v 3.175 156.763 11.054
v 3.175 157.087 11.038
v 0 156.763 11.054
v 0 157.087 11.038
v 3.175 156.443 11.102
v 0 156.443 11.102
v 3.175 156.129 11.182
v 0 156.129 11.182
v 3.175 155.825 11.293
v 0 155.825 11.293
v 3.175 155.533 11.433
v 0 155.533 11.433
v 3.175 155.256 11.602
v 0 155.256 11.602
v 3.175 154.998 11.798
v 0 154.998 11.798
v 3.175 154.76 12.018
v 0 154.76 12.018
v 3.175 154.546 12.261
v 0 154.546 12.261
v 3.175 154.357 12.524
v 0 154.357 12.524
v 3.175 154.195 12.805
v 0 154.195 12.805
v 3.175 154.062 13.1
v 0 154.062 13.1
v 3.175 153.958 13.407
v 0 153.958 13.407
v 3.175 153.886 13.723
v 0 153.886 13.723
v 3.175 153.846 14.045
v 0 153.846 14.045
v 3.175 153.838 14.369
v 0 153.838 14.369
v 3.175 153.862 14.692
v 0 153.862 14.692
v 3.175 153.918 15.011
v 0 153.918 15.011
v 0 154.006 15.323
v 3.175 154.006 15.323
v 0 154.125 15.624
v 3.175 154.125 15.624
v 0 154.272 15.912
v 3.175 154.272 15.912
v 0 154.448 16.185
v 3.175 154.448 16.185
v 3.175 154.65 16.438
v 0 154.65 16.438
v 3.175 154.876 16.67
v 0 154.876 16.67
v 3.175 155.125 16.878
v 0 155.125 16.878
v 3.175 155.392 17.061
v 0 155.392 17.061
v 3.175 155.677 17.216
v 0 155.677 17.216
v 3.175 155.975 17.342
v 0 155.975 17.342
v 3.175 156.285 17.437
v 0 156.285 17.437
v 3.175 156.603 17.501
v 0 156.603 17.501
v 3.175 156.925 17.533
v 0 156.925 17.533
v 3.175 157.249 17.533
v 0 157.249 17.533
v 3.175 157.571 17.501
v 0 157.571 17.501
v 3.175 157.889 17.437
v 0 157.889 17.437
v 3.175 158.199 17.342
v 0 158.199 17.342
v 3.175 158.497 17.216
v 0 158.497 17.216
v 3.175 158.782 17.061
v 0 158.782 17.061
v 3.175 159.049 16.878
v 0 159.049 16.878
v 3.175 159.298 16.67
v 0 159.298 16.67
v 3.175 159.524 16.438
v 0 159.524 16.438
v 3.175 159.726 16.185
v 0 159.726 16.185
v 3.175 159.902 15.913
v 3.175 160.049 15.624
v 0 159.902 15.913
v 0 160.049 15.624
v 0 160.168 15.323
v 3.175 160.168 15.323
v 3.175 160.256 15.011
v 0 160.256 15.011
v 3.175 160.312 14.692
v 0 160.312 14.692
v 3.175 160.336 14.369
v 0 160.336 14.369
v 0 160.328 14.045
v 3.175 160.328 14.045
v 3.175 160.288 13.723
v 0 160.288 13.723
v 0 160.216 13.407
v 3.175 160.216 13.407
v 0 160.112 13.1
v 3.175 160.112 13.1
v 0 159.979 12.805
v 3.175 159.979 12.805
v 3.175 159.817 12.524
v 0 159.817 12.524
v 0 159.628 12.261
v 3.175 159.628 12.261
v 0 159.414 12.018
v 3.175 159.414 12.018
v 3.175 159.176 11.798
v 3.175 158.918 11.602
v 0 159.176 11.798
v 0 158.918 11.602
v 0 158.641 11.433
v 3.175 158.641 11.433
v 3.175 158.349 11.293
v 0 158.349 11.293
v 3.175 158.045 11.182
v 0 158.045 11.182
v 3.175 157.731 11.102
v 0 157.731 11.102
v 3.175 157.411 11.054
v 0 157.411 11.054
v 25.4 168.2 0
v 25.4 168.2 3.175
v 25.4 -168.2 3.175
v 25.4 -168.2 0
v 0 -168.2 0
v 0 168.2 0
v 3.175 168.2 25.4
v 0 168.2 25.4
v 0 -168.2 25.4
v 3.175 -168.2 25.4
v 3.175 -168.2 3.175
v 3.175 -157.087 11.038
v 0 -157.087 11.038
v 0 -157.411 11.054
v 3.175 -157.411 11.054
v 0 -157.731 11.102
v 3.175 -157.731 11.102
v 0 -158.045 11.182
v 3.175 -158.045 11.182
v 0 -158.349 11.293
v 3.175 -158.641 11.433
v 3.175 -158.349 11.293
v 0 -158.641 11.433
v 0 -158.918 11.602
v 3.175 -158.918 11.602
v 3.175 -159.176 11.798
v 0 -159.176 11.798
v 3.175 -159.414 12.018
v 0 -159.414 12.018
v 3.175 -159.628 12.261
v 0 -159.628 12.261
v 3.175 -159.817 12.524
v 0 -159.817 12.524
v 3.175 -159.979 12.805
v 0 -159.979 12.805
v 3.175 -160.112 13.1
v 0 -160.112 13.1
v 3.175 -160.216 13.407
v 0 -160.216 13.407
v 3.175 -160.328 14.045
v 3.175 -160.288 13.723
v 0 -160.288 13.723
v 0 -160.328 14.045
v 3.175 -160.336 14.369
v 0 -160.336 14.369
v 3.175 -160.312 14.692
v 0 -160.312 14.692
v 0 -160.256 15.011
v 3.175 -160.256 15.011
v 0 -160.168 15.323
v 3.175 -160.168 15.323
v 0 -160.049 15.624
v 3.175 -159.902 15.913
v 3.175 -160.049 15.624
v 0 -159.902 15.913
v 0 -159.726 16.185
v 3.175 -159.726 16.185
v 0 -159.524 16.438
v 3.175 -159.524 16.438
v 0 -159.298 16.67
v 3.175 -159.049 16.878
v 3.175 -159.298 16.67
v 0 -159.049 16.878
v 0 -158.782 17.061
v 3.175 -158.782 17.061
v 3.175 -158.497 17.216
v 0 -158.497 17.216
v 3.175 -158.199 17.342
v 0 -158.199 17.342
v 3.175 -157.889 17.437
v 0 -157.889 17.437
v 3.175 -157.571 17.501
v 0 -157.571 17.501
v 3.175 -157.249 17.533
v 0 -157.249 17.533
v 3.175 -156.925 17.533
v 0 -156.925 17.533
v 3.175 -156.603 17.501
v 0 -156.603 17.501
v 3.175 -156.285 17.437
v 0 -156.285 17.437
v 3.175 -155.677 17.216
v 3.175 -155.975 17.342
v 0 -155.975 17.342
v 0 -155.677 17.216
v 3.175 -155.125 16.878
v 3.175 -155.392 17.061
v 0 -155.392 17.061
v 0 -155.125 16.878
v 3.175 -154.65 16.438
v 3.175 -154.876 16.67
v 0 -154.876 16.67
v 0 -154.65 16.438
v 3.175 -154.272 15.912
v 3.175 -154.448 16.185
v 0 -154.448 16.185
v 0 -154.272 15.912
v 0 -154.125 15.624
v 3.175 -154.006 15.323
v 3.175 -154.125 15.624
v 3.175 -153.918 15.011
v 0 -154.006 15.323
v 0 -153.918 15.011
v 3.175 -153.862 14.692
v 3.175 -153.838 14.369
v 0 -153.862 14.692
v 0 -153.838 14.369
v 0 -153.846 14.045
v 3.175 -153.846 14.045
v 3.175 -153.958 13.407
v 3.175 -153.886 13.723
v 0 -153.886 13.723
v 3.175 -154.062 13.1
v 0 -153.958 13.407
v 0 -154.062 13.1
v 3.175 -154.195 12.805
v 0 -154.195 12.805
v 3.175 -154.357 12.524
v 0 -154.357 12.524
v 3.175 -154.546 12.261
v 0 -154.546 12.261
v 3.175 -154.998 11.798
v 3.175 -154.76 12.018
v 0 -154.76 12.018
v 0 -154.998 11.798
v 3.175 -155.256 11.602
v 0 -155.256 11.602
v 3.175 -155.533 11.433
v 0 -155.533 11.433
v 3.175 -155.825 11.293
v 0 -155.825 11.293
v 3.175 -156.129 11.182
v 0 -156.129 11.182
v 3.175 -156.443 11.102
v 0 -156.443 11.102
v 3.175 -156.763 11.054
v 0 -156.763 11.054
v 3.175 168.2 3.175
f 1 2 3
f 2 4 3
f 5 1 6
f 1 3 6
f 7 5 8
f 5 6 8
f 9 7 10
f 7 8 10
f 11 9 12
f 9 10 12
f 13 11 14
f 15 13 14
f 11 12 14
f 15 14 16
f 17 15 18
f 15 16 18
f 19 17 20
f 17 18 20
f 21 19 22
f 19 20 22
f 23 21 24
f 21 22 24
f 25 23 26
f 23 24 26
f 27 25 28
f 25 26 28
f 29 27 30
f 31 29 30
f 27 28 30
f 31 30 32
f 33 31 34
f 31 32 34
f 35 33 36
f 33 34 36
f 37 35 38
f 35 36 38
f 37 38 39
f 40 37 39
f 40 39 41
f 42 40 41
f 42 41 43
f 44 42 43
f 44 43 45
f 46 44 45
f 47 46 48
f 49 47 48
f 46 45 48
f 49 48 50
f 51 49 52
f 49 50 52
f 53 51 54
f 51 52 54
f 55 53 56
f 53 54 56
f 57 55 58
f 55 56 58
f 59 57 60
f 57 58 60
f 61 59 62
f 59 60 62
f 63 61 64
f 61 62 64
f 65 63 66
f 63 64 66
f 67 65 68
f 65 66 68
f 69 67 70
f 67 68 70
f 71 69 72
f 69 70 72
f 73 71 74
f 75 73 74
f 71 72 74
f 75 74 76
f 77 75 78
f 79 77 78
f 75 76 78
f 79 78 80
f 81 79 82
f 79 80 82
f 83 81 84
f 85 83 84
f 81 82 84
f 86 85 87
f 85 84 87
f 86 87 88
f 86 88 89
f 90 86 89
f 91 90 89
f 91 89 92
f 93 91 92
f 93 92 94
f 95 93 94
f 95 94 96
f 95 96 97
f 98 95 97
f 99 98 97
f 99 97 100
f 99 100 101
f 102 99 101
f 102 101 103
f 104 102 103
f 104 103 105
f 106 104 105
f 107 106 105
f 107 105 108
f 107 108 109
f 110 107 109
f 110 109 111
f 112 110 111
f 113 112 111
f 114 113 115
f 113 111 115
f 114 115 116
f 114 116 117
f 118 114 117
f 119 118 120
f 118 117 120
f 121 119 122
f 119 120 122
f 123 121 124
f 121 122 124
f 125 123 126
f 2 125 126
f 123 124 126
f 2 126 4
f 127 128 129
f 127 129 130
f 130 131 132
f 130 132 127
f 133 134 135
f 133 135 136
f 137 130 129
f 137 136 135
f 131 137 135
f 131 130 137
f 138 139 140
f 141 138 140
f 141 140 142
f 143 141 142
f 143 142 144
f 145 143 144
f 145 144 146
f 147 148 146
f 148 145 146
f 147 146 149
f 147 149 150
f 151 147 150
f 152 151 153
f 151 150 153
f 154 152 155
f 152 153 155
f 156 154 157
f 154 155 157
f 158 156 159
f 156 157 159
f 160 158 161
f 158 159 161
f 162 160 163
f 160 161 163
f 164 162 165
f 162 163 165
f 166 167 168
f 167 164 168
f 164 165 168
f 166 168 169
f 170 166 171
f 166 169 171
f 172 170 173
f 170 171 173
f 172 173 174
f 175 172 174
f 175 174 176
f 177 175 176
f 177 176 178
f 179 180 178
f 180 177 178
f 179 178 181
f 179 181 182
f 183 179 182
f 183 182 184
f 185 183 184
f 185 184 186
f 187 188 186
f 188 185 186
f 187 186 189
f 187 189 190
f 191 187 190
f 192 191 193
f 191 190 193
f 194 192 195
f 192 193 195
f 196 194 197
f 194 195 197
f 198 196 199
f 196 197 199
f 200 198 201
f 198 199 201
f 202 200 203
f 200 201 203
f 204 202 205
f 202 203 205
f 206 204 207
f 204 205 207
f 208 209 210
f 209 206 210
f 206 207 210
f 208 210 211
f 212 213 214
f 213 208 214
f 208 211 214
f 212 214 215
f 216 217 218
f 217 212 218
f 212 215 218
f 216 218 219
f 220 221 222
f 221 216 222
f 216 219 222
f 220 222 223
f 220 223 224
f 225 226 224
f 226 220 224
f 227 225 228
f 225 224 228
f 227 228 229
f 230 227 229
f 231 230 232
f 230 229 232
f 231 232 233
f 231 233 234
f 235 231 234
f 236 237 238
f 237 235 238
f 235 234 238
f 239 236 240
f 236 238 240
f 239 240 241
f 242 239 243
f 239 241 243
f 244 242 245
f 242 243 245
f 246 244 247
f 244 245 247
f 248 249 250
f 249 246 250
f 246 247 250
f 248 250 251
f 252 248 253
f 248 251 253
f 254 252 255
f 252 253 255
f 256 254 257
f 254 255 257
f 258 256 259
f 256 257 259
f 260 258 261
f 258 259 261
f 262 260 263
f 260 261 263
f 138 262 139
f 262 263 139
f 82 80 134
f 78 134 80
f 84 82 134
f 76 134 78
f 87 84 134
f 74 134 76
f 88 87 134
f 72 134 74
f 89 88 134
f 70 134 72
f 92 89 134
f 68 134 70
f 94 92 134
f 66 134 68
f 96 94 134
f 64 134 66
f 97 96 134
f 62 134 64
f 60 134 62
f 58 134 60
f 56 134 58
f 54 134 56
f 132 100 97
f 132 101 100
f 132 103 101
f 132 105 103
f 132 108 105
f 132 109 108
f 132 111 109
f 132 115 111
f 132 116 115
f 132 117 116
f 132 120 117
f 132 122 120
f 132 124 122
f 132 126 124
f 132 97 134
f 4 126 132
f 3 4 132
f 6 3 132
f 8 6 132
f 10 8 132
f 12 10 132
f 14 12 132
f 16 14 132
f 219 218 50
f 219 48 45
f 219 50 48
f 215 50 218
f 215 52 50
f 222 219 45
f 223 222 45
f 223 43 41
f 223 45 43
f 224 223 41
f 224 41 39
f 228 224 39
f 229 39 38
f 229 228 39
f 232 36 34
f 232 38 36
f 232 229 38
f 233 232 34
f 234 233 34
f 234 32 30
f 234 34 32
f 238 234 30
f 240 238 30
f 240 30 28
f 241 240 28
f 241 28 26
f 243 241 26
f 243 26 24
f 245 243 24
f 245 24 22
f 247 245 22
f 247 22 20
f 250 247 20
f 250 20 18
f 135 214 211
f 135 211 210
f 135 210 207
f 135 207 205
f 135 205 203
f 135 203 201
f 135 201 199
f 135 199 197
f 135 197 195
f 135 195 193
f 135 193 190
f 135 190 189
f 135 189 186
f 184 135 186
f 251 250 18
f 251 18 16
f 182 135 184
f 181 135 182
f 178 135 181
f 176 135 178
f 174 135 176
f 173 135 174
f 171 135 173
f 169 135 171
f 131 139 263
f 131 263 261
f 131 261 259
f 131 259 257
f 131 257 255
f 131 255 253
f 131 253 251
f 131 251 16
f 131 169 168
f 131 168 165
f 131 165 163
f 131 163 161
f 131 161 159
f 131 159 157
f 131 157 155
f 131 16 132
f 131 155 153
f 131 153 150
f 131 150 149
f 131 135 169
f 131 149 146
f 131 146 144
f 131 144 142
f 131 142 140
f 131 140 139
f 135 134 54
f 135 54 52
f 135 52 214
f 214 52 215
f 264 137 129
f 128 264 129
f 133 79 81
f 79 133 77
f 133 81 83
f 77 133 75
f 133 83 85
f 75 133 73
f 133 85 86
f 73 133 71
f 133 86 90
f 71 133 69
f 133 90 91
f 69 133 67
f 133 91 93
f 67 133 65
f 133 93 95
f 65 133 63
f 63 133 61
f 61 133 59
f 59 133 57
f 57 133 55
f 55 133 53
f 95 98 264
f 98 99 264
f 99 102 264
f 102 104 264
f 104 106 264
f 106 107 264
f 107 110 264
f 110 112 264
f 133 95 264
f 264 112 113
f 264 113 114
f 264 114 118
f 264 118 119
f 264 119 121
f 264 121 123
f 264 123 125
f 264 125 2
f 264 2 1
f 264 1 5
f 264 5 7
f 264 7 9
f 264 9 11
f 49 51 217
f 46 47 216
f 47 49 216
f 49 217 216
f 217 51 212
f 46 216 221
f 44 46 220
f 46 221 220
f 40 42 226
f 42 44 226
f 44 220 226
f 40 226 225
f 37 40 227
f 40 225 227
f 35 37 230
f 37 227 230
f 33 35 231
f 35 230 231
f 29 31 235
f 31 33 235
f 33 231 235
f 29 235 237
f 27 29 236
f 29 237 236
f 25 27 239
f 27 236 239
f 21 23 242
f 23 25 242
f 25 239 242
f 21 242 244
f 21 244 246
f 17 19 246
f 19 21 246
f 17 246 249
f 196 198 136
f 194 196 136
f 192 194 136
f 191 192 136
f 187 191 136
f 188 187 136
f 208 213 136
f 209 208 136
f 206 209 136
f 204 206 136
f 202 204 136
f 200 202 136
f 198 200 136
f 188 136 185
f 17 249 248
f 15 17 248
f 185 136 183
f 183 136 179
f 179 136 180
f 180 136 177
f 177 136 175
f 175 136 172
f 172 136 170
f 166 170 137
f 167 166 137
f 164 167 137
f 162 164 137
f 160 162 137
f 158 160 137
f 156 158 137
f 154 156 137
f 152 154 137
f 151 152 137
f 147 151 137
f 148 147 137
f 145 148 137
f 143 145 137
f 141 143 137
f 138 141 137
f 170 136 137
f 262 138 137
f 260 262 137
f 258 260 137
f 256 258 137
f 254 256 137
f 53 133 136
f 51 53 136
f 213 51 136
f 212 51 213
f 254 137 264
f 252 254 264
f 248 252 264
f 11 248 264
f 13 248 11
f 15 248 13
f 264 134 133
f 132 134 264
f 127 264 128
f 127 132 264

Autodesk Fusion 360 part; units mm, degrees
sketch "Sketch1" plane through (0, 0, 0) normal (0, 1, 0) x (1, 0, 0)
  line L0 (0, -25.4) -> (0, 0)
  line L1 (0, 0) -> (25.4, 0)
  line L2 (12.7, -12.7) -> (11.05, -11.05) construction
  line L3 (3.175, -25.4) -> (3.175, -3.175)
  line L4 (3.175, -3.175) -> (25.4, -3.175)
  line L5 (25.4, -3.175) -> (25.4, 0)
  line L6 (0, -25.4) -> (3.175, -25.4)
  dimension "d1" = 25.4
  dimension "d2" = 25.4
  dimension "d13" = 3.175
extrude "Extrude1" add sketch "Sketch1" along normal blind 168.2
hole "Hole3" at (3.175, 157.087, 14.2875) direction (-1, 0, 0) diameter 6.5 end through all
mirror "Mirror1" about plane through (0, 0, 0) normal (0, 1, 0) of bodies 1 merged
equation "d5 = ( 336.4 / 2 ) * 1 mm"
equation "d27 = ( 22.225 / 2 ) * 1 mm"
